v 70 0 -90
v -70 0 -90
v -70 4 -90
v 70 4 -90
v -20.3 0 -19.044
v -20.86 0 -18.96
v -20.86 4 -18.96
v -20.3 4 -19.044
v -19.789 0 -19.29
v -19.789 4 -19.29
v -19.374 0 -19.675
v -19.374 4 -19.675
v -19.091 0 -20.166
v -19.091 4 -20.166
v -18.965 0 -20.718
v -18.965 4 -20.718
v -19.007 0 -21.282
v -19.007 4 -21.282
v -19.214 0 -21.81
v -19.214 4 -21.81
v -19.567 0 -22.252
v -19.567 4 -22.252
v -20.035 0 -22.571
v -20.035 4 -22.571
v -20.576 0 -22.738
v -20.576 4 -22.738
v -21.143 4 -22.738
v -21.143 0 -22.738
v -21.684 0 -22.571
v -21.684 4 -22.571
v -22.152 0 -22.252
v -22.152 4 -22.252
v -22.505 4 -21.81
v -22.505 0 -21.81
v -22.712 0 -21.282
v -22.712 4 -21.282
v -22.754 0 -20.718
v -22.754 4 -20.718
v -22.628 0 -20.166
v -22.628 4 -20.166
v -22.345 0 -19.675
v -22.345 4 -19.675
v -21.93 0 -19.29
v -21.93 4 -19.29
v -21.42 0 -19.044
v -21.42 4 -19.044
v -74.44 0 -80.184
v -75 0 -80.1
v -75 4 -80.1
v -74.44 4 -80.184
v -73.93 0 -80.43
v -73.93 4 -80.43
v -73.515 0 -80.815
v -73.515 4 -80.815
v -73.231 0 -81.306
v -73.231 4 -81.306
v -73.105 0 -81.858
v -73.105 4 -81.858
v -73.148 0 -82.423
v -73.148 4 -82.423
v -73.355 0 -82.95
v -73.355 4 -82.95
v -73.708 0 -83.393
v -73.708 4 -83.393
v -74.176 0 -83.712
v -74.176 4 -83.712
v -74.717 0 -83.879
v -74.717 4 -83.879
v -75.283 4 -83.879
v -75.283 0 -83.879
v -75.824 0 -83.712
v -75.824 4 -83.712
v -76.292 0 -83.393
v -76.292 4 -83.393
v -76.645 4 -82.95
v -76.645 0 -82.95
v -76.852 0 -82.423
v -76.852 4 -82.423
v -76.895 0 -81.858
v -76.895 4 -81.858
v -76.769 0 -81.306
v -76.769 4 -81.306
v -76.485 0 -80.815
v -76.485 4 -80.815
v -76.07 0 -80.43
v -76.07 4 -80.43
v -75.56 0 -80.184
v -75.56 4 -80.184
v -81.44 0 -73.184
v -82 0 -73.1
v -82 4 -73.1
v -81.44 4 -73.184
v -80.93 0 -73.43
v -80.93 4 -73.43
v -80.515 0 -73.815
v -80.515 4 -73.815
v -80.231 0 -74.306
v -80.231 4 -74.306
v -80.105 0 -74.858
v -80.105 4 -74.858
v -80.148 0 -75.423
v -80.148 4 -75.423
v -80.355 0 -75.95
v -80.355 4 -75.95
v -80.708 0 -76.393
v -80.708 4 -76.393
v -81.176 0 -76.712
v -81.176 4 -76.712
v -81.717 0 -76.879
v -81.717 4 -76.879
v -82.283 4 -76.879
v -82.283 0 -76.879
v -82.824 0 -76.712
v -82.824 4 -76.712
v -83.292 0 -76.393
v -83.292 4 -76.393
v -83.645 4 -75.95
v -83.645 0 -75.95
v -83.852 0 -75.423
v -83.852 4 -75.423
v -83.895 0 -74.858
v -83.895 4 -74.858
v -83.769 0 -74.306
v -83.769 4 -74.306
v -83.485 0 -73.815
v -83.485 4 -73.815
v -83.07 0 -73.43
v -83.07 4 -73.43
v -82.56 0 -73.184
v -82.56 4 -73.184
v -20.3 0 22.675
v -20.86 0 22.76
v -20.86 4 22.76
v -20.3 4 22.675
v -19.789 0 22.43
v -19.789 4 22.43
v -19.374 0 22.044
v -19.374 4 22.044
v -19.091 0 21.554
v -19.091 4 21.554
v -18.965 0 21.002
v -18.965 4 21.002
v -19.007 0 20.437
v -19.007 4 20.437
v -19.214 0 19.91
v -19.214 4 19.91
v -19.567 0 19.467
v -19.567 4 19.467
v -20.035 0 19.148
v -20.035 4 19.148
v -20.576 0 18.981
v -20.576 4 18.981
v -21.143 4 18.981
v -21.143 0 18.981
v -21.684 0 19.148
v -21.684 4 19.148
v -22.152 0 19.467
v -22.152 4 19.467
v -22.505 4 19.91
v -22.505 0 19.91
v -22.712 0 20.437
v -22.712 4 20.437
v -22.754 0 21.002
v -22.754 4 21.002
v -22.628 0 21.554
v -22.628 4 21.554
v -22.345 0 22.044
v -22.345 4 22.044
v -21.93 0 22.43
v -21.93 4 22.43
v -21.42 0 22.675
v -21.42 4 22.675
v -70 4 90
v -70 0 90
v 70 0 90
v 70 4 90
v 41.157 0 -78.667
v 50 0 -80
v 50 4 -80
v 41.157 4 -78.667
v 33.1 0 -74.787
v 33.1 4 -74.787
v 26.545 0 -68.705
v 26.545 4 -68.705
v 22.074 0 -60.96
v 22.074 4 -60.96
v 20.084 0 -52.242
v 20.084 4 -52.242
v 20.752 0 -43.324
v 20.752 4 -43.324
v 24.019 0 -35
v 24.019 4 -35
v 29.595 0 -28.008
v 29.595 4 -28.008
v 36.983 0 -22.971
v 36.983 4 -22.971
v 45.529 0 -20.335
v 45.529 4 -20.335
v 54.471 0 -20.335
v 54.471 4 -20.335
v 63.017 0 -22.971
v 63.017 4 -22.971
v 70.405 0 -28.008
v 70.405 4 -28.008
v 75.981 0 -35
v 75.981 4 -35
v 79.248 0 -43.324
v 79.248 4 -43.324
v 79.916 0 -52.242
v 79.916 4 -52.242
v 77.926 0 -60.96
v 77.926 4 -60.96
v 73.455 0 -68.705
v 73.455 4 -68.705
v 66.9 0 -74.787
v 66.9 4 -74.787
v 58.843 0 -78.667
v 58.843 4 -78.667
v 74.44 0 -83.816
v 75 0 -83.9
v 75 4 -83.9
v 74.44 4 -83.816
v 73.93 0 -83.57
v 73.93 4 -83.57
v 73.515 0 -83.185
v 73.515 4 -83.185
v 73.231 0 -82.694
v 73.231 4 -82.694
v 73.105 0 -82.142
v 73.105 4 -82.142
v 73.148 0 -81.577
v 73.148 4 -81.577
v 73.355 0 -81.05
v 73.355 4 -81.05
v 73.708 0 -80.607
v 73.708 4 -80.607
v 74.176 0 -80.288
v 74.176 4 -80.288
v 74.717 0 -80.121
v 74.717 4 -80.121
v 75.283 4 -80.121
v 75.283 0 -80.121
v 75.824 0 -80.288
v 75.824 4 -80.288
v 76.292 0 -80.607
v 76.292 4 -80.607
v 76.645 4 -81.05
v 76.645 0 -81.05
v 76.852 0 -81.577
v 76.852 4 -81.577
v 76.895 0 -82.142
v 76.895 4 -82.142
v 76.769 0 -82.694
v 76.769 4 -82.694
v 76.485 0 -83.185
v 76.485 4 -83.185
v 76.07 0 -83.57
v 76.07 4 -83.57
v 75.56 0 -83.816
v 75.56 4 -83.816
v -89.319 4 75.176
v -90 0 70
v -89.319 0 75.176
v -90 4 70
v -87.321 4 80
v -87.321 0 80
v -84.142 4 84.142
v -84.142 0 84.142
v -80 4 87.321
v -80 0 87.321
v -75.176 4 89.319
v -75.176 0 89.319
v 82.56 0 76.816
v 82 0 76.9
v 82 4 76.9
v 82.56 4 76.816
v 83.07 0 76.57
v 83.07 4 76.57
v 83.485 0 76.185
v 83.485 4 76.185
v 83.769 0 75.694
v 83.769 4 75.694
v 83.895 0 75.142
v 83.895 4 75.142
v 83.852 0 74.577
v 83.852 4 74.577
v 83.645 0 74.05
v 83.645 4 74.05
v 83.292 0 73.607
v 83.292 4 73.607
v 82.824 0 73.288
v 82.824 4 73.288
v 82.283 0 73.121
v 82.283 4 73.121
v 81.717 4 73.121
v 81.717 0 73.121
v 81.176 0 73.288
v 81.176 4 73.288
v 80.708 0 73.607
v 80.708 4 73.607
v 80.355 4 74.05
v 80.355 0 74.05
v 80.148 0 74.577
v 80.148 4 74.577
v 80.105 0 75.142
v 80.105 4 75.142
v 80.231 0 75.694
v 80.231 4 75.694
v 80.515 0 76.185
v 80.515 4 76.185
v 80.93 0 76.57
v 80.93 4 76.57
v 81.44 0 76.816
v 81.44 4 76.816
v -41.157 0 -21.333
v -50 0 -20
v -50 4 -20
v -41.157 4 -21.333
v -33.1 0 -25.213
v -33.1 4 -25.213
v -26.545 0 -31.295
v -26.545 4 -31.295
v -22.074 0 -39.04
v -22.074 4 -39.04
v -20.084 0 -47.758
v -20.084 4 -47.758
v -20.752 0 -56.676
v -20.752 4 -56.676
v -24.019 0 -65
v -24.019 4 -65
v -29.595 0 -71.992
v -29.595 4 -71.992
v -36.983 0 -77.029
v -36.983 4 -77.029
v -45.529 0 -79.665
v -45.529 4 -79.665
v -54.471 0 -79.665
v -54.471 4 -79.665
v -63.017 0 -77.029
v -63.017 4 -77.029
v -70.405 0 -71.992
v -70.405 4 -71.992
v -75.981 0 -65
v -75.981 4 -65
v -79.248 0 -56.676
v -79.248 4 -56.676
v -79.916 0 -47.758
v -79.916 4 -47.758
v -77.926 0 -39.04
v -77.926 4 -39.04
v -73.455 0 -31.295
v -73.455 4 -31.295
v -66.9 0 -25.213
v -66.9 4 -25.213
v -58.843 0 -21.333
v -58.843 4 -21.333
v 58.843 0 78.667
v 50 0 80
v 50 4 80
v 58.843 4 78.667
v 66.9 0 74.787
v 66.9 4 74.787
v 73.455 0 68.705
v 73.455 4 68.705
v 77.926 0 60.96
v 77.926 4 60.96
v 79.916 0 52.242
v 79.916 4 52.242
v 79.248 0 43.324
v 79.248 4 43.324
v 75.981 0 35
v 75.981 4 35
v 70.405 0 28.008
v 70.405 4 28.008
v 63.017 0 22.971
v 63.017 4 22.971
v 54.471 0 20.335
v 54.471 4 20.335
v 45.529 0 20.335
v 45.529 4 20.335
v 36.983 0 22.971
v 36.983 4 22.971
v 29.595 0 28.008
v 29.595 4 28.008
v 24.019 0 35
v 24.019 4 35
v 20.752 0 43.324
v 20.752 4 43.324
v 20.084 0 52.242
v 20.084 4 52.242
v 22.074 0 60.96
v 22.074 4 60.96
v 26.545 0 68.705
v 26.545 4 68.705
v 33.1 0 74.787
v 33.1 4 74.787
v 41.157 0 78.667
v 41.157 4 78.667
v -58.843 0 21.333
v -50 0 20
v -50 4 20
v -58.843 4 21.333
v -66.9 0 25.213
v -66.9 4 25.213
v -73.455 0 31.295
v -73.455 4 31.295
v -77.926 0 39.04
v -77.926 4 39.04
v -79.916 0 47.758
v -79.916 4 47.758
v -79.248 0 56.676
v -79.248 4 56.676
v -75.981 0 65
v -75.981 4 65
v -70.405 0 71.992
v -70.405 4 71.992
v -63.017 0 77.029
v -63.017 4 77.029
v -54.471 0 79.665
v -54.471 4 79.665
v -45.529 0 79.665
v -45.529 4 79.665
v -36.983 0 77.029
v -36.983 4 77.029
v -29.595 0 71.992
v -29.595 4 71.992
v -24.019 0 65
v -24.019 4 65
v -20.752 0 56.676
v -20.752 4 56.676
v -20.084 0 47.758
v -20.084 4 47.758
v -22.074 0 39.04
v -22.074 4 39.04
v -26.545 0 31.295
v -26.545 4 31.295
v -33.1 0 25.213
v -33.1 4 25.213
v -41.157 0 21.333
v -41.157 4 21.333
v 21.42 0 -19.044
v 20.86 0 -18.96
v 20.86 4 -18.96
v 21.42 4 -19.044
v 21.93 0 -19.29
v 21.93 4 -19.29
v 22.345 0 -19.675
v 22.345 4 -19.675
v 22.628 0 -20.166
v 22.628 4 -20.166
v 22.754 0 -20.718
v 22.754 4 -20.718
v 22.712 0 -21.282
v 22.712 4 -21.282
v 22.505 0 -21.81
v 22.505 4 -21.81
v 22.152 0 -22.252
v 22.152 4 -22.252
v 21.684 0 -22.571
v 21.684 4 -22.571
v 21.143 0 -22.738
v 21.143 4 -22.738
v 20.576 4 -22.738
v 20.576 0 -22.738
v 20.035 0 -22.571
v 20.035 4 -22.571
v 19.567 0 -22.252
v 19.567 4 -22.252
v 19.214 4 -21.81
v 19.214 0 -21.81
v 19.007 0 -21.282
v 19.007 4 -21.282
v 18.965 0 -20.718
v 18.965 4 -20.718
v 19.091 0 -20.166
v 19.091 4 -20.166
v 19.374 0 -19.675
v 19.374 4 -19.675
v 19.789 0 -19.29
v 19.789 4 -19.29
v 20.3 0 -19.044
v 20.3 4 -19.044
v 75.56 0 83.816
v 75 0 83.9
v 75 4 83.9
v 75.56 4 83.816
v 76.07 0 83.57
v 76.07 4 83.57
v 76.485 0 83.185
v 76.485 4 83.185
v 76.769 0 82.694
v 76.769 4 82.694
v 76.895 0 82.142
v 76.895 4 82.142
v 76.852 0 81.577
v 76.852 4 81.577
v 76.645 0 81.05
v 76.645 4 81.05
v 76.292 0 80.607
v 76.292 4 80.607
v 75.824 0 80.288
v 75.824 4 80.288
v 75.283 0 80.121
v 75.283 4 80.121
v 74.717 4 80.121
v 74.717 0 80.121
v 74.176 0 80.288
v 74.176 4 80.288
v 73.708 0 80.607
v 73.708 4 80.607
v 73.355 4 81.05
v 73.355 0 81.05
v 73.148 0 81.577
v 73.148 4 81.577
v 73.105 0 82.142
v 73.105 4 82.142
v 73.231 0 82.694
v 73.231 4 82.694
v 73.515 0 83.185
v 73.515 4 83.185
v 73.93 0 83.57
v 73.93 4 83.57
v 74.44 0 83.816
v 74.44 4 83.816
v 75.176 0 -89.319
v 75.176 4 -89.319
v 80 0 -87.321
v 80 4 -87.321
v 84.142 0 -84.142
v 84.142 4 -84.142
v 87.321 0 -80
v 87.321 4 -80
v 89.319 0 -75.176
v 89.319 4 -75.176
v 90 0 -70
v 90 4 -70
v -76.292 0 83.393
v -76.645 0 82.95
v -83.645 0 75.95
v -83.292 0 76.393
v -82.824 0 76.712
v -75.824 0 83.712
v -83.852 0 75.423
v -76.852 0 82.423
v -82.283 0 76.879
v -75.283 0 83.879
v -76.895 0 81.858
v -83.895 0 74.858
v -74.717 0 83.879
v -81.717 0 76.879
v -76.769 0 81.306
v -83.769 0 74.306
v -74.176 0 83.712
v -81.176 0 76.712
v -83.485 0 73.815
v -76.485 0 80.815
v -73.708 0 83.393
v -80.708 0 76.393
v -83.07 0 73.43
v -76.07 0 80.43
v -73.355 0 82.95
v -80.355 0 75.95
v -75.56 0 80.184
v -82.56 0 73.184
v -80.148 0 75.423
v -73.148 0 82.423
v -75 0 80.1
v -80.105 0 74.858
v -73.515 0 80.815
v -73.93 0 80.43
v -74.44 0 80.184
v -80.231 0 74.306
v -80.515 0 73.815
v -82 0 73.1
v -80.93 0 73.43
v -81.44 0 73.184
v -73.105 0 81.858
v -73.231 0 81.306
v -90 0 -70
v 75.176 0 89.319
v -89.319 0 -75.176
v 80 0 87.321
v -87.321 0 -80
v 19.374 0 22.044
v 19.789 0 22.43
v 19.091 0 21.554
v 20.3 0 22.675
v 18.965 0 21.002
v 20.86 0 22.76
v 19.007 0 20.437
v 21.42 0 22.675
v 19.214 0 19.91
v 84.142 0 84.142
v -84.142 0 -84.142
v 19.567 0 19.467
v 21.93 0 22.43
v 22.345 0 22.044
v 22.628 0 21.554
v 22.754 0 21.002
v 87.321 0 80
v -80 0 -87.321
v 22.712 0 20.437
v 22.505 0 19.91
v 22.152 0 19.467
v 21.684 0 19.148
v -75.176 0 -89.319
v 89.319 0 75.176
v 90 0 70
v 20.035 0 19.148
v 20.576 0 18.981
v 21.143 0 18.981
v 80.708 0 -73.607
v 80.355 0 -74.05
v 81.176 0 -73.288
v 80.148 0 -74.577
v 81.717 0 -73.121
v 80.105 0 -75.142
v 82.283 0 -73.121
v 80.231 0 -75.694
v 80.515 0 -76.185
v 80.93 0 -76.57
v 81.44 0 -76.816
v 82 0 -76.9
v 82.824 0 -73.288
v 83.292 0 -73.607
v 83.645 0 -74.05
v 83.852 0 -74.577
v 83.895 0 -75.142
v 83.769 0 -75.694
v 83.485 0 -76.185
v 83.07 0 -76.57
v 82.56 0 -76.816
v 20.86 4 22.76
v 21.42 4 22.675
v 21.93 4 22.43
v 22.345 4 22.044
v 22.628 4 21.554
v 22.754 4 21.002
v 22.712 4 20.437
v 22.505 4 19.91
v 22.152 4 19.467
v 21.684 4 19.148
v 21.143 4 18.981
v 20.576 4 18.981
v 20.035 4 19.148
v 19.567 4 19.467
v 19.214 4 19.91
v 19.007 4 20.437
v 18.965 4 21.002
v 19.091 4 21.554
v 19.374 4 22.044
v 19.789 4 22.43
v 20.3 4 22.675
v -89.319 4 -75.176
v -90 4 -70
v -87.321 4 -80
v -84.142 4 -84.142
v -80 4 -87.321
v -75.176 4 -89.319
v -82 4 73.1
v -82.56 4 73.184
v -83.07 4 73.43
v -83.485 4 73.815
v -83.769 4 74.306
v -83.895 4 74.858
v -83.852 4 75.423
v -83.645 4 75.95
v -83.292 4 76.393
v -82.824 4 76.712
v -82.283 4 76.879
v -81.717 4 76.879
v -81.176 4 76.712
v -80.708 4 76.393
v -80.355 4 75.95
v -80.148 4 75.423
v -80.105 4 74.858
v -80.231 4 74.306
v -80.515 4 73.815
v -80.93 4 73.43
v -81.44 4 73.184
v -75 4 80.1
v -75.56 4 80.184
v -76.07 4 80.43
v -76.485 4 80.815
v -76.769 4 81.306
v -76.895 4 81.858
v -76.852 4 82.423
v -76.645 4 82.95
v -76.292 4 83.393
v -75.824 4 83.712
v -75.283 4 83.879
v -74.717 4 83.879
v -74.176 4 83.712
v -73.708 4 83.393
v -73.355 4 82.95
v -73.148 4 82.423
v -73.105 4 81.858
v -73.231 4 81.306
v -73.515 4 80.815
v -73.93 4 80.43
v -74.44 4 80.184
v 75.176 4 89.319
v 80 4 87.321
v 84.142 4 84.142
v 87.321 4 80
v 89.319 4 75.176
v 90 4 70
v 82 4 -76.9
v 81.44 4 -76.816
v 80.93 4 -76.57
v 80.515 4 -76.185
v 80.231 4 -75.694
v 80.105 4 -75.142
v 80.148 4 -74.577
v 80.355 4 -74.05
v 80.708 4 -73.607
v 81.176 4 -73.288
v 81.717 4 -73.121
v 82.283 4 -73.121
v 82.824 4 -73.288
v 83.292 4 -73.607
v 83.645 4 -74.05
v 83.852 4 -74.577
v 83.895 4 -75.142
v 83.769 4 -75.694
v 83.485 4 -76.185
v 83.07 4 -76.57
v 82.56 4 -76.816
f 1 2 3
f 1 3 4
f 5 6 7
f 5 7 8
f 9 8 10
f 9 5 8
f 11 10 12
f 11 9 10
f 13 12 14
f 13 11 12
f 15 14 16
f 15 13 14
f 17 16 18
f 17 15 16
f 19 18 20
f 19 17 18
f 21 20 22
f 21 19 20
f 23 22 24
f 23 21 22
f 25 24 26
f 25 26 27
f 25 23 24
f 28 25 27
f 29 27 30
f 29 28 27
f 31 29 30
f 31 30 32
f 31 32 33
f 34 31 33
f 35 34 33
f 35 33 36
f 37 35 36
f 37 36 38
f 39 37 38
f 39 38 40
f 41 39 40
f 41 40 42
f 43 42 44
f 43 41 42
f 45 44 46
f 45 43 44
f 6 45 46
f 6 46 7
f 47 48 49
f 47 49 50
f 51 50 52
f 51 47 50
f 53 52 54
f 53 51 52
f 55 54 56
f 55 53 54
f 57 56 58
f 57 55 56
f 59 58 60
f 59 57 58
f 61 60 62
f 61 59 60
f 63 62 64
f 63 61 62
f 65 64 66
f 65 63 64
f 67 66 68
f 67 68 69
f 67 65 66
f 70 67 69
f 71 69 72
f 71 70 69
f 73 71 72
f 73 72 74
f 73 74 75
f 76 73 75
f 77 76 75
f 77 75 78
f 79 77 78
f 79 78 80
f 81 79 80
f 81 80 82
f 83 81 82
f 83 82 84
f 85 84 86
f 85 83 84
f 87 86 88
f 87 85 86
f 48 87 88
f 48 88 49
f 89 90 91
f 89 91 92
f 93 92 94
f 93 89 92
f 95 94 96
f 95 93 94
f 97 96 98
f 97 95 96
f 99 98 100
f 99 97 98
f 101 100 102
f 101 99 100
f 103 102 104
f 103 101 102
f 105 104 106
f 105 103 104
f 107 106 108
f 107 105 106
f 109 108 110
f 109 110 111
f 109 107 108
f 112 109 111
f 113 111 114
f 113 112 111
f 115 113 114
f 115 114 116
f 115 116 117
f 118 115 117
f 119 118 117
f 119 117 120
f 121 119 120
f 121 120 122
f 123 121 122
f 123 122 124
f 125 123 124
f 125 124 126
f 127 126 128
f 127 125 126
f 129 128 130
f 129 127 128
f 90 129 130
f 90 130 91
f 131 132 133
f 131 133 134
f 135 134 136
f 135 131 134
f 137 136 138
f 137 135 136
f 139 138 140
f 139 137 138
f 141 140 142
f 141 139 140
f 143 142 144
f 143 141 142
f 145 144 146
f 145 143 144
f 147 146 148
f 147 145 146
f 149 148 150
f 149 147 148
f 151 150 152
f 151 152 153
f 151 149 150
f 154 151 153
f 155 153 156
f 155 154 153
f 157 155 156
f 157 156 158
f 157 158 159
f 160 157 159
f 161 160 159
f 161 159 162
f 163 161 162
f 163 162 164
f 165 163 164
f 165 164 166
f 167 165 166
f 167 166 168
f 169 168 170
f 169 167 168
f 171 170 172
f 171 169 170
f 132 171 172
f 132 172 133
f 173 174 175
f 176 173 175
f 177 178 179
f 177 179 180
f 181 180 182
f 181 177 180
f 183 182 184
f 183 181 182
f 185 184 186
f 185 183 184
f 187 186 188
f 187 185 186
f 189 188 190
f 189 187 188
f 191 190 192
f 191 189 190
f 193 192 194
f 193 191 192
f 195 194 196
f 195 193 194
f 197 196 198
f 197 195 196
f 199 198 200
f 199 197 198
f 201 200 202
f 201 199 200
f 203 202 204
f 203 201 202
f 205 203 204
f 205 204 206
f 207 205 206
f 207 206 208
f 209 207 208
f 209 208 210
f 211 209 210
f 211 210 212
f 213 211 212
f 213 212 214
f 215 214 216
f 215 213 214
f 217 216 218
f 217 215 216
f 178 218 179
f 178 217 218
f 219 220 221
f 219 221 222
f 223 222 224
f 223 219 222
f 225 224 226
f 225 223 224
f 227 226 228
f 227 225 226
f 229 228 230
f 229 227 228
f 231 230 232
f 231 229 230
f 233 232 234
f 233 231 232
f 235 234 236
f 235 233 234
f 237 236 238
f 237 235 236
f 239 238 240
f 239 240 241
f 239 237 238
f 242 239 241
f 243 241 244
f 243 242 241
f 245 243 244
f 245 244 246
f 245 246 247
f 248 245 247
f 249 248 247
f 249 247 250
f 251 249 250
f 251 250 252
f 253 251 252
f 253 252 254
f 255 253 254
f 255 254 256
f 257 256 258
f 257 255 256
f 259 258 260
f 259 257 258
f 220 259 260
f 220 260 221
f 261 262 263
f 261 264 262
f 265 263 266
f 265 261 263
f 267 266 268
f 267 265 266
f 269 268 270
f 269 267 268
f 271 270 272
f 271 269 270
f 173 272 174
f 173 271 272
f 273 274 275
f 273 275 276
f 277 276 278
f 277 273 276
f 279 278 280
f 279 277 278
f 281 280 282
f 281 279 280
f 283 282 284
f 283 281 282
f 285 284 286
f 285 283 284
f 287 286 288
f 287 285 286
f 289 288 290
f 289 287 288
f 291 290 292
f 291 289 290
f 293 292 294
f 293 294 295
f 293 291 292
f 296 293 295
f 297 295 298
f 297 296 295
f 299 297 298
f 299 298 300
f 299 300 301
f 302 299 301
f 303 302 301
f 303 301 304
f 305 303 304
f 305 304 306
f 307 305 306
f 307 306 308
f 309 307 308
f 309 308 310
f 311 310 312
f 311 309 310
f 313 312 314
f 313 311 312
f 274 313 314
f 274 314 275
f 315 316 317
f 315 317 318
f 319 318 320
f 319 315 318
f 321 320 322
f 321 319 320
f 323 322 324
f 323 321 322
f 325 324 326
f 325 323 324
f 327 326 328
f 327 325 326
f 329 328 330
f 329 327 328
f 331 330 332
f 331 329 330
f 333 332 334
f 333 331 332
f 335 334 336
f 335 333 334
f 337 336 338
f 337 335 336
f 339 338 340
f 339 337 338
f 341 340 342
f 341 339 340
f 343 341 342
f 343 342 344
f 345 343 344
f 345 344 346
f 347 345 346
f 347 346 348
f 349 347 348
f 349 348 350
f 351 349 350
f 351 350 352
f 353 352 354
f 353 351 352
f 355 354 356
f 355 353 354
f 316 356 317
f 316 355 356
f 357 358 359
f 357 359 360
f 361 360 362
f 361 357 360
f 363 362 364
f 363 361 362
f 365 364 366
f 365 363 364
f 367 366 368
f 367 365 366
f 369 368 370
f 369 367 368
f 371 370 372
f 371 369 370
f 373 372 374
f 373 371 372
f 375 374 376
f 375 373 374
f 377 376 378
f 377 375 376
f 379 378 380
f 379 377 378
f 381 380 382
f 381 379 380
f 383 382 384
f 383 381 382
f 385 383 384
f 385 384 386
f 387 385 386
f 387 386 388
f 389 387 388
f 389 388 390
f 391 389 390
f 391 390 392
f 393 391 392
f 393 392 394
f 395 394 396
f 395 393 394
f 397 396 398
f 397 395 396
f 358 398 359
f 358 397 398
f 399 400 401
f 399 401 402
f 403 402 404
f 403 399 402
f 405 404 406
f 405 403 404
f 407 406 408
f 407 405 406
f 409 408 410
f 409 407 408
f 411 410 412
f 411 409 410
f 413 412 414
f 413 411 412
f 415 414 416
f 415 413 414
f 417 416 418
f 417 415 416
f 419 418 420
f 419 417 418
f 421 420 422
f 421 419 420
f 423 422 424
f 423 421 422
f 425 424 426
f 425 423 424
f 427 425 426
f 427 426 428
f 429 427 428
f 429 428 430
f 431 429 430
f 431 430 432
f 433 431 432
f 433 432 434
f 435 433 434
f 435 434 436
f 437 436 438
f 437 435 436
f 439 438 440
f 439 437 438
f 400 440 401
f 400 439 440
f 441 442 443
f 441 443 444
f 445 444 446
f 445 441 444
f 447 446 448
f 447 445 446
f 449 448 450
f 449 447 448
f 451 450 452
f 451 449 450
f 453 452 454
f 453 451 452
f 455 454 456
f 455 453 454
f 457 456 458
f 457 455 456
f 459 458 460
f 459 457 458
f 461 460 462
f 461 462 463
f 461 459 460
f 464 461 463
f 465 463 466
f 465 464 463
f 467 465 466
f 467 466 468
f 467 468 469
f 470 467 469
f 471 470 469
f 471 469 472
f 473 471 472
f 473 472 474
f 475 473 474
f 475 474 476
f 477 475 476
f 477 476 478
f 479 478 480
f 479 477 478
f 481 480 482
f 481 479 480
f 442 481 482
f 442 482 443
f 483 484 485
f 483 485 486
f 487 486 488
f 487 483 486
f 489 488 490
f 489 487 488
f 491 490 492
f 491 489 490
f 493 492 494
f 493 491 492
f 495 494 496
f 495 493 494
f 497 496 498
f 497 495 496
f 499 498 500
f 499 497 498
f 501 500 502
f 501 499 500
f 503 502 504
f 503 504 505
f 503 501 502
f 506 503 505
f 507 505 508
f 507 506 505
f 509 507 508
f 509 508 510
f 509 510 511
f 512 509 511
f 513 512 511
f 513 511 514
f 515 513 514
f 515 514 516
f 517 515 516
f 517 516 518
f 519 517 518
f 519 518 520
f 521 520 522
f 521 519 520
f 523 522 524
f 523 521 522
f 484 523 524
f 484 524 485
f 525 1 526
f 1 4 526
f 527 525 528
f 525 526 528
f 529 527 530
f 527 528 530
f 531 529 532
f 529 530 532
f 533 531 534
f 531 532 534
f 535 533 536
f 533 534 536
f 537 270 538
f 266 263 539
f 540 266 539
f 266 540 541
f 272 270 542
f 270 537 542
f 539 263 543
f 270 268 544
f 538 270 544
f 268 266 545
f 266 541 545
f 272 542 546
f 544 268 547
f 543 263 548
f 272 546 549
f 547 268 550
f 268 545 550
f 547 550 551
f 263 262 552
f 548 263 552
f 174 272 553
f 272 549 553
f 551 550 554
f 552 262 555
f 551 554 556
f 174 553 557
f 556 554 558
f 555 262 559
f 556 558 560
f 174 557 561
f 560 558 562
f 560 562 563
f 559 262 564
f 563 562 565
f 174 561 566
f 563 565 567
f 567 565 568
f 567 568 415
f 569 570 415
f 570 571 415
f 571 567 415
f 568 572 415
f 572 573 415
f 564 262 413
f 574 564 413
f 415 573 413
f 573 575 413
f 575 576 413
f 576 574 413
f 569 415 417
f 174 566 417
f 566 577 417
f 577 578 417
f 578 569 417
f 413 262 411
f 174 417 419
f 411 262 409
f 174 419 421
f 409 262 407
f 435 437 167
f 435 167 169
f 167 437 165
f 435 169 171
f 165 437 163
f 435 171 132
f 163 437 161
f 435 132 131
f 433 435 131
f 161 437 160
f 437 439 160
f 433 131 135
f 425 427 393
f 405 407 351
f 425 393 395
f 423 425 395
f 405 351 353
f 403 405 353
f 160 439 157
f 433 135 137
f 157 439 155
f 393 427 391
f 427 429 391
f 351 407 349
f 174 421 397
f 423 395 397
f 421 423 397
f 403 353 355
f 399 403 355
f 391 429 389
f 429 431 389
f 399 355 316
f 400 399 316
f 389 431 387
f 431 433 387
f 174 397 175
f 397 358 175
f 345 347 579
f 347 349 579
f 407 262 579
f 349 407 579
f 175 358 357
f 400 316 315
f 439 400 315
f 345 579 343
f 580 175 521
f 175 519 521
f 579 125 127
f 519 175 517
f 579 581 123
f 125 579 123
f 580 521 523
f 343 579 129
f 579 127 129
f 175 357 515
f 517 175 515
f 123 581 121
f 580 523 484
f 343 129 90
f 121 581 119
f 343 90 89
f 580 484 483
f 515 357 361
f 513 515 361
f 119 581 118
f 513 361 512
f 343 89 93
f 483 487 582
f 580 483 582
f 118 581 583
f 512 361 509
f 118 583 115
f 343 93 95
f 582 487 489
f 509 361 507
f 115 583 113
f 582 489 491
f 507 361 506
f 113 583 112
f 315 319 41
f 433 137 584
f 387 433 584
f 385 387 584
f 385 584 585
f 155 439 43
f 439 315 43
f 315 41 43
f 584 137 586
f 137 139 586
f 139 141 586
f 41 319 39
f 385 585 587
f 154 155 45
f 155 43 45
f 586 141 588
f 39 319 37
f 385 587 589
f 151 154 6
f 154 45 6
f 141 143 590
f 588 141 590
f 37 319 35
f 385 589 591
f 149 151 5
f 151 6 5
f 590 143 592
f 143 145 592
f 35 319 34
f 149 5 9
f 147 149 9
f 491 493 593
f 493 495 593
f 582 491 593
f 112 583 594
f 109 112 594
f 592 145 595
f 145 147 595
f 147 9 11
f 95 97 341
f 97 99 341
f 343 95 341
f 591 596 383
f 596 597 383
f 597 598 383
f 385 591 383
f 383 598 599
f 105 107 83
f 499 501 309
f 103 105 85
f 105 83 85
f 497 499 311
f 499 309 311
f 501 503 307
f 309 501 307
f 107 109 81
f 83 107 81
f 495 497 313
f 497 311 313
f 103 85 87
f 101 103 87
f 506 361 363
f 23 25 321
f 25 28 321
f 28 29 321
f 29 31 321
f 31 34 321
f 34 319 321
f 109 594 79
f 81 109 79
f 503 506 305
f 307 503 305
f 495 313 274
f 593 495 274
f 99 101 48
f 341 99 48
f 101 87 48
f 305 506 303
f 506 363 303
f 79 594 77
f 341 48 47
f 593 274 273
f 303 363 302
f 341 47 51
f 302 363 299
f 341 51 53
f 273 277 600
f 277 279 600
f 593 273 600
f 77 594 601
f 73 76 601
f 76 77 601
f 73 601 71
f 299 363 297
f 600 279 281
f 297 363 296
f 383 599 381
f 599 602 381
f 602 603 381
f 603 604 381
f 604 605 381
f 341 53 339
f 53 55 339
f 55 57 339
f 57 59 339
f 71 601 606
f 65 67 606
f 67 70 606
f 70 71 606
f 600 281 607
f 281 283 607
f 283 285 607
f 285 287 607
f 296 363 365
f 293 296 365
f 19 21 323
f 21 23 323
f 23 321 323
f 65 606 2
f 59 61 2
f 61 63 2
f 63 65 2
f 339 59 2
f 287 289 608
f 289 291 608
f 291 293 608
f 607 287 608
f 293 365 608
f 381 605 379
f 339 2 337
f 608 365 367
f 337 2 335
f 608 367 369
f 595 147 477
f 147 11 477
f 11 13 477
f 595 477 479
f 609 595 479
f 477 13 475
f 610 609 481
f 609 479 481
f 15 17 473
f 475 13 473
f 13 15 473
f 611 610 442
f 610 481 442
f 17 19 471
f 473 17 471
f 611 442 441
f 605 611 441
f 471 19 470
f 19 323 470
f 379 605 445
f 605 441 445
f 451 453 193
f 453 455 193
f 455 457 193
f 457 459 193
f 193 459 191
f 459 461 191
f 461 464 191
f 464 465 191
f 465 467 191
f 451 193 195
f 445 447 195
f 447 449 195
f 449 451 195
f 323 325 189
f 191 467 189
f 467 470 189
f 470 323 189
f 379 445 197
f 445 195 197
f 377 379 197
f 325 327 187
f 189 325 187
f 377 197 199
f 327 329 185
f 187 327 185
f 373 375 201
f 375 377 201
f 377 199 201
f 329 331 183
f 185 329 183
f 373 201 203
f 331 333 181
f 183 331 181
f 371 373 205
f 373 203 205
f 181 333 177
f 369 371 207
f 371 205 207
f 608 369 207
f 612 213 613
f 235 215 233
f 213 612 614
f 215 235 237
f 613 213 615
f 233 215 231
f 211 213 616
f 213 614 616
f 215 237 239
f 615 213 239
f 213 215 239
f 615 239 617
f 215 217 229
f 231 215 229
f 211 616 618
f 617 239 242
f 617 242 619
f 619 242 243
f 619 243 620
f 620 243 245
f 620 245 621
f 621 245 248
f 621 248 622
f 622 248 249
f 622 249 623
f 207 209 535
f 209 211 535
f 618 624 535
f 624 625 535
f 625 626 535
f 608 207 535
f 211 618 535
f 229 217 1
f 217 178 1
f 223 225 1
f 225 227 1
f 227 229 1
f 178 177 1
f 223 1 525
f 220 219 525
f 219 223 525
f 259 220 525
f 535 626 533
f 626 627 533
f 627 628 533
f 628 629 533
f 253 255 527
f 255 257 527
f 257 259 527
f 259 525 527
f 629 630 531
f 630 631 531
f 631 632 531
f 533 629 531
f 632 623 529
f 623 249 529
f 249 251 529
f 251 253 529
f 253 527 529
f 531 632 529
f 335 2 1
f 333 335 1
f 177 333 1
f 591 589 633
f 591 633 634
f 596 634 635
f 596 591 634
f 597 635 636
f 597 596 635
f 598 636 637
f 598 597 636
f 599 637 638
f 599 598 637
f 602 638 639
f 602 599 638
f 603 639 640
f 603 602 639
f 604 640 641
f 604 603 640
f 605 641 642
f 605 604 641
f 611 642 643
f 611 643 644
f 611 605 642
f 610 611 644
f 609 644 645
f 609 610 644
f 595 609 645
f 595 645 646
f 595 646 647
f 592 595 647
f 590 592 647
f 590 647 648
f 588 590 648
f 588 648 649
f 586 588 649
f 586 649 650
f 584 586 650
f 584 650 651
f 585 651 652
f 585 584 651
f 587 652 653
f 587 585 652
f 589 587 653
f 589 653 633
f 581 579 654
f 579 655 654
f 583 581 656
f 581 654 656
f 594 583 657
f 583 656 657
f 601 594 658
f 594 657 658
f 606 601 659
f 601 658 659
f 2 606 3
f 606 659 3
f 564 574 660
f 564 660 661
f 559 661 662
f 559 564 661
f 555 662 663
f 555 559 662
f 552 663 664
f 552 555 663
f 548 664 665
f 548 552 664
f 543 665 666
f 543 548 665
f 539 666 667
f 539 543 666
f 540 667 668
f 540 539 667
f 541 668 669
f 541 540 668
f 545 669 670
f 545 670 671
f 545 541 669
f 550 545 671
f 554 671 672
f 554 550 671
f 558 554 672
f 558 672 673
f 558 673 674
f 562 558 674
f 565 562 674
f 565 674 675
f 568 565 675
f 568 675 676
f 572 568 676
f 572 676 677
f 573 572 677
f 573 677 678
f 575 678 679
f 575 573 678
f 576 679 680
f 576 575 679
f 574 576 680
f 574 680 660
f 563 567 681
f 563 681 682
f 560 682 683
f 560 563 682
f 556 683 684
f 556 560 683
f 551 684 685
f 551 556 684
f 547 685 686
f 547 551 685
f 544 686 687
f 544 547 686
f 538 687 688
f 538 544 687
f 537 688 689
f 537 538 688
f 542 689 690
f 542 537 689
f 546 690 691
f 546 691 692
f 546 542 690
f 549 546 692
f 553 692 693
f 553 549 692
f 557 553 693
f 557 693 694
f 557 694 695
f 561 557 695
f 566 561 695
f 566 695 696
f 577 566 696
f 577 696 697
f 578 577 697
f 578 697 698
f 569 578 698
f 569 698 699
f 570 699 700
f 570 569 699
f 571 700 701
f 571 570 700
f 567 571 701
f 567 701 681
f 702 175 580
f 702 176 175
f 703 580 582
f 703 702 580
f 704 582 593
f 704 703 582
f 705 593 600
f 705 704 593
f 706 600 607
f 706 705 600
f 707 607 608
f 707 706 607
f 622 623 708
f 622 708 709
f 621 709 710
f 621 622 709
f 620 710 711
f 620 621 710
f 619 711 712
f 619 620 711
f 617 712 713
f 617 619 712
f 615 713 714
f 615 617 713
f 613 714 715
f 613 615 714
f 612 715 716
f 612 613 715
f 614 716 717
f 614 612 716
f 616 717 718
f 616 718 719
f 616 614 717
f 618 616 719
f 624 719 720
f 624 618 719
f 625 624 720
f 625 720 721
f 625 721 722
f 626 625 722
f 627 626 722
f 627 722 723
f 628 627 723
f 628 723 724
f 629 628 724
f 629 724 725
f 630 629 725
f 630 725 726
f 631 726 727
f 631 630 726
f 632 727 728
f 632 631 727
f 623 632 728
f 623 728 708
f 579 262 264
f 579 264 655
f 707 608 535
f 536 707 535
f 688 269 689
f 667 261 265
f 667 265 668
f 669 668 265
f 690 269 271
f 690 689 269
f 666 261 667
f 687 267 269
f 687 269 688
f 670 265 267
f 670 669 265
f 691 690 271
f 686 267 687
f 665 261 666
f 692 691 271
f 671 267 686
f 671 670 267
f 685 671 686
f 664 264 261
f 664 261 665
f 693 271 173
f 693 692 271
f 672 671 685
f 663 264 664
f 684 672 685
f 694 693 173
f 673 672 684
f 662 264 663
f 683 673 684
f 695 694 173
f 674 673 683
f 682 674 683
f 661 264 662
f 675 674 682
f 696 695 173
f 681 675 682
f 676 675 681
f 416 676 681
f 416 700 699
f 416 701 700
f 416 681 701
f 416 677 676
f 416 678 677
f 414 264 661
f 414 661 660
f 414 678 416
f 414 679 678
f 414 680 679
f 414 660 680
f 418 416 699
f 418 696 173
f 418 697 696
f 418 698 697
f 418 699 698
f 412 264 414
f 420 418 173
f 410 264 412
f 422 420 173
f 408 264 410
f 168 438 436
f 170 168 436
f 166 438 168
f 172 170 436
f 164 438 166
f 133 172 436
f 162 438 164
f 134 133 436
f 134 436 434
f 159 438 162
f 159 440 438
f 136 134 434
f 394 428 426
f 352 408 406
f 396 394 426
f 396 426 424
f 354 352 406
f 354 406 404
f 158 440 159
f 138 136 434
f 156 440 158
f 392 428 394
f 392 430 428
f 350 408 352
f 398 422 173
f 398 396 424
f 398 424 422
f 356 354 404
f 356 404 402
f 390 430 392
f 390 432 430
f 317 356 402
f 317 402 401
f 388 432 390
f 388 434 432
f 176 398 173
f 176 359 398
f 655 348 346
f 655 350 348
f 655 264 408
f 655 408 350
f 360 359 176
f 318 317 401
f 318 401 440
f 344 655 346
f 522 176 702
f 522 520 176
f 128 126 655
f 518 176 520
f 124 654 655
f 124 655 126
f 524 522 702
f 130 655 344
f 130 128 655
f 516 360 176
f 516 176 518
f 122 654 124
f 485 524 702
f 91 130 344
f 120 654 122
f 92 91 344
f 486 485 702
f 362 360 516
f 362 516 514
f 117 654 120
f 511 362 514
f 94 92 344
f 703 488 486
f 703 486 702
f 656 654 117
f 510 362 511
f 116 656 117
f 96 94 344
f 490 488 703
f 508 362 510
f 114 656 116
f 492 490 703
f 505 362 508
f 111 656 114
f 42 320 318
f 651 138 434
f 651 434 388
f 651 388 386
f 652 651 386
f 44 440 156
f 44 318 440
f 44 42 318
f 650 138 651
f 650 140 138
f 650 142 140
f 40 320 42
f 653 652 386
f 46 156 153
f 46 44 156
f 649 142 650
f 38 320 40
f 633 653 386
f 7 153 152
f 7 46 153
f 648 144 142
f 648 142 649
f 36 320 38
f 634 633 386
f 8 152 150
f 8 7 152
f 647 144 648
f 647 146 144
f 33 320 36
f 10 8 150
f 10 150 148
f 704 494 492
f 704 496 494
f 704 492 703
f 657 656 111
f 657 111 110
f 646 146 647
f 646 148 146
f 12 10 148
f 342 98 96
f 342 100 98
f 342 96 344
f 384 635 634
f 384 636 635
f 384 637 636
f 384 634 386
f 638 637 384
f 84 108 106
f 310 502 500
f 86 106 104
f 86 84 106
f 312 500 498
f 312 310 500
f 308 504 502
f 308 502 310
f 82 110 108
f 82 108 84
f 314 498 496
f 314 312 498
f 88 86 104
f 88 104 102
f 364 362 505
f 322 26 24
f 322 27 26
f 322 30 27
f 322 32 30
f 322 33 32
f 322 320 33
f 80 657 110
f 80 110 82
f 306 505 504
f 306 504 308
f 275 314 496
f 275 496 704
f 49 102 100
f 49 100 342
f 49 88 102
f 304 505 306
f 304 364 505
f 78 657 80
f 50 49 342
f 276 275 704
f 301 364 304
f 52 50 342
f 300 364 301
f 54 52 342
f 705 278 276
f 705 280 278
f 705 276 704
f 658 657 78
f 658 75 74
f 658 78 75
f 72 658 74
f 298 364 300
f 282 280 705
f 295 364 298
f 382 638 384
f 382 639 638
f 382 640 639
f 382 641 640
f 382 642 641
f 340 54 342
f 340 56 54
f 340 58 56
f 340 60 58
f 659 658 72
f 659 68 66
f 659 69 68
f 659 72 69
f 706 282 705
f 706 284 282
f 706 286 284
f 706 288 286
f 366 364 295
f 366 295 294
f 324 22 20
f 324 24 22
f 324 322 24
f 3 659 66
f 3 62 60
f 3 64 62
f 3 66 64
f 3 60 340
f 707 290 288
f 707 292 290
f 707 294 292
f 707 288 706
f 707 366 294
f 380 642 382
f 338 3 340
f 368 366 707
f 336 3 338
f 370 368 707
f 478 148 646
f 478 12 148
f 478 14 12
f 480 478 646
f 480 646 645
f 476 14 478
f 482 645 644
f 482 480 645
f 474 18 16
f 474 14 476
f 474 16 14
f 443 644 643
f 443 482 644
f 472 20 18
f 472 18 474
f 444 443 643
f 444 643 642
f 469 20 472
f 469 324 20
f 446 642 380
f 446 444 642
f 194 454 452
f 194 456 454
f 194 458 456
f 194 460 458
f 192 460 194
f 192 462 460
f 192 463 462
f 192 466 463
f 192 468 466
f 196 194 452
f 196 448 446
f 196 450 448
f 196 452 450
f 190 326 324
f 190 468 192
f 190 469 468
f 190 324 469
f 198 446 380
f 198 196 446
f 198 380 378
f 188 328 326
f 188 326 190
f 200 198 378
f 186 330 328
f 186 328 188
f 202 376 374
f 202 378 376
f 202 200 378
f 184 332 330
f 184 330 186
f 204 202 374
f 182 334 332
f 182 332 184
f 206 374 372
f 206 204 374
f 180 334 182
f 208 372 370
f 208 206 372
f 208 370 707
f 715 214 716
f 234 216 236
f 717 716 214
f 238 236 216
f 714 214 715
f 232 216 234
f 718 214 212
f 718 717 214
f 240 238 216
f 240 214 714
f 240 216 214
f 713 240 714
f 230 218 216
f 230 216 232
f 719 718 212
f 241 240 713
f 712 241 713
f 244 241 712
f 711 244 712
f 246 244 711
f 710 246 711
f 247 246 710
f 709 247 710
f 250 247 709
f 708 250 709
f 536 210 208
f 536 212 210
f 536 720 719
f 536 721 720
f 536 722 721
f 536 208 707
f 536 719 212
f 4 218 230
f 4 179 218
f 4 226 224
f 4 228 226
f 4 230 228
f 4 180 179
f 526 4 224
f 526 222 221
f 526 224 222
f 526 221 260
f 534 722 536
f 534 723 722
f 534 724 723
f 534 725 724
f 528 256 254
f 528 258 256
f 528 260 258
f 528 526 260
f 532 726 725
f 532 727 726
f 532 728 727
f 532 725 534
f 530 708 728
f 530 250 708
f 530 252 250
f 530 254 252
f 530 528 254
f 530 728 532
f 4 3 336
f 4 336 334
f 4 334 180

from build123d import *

# Parameters (mm, degrees)
SKETCH_1_W      = 180
SKETCH_1_H      = 180
SKETCH_1_R      = 1.9
SKETCH_1_R_2    = 30
EXTRUDE_1_DEPTH = 4
FILLET_1_R      = 20


with BuildPart() as part:
    # Эскиз1 → Бобышка-Вытянуть1 (new body)
    with BuildSketch(Plane(origin=(0, 0, 0), x_dir=(1, 0, 0), z_dir=(0, 1, 0))):
        Rectangle(SKETCH_1_W, SKETCH_1_H)
        with Locations(Location((-75, 82, 0), (0, 0, 270))):
            Circle(SKETCH_1_R, mode=Mode.SUBTRACT)
        with Locations(Location((-82, 75, 0), (0, 0, 270))):
            Circle(SKETCH_1_R, mode=Mode.SUBTRACT)
        with Locations(Location((82, 75, 0), (0, 0, 90))):
            Circle(SKETCH_1_R, mode=Mode.SUBTRACT)
        with Locations(Location((75, 82, 0), (0, 0, 90))):
            Circle(SKETCH_1_R, mode=Mode.SUBTRACT)
        with Locations(Location((75, -82, 0), (0, 0, 270))):
            Circle(SKETCH_1_R, mode=Mode.SUBTRACT)
        with Locations(Location((82, -75, 0), (0, 0, 270))):
            Circle(SKETCH_1_R, mode=Mode.SUBTRACT)
        with Locations(Location((-82, -75, 0), (0, 0, 90))):
            Circle(SKETCH_1_R, mode=Mode.SUBTRACT)
        with Locations(Location((-75, -82, 0), (0, 0, 90))):
            Circle(SKETCH_1_R, mode=Mode.SUBTRACT)
        with Locations(Location((20.859650045, 20.859650045, 0), (0, 0, 270))):
            Circle(SKETCH_1_R, mode=Mode.SUBTRACT)
        with Locations(Location((20.859650045, -20.859650045, 0), (0, 0, 270))):
            Circle(SKETCH_1_R, mode=Mode.SUBTRACT)
        with Locations(Location((-20.859650045, -20.859650045, 0), (0, 0, 270))):
            Circle(SKETCH_1_R, mode=Mode.SUBTRACT)
        with Locations(Location((-20.859650045, 20.859650045, 0), (0, 0, 270))):
            Circle(SKETCH_1_R, mode=Mode.SUBTRACT)
        with Locations(Location((-50, 50, 0), (0, 0, 270))):
            Circle(SKETCH_1_R_2, mode=Mode.SUBTRACT)
        with Locations(Location((50, 50, 0), (0, 0, 90))):
            Circle(SKETCH_1_R_2, mode=Mode.SUBTRACT)
        with Locations(Location((-50, -50, 0), (0, 0, 90))):
            Circle(SKETCH_1_R_2, mode=Mode.SUBTRACT)
        with Locations(Location((50, -50, 0), (0, 0, 270))):
            Circle(SKETCH_1_R_2, mode=Mode.SUBTRACT)
    extrude(amount=EXTRUDE_1_DEPTH)

    # Скругление1
    fillet_1_edges = [part.edges().sort_by_distance(p)[0] for p in [
        (90, 2, 90),
        (-90, 2, 90),
        (-90, 2, -90),
        (90, 2, -90),
    ]]
    fillet(fillet_1_edges, radius=FILLET_1_R)


solid = part.part
